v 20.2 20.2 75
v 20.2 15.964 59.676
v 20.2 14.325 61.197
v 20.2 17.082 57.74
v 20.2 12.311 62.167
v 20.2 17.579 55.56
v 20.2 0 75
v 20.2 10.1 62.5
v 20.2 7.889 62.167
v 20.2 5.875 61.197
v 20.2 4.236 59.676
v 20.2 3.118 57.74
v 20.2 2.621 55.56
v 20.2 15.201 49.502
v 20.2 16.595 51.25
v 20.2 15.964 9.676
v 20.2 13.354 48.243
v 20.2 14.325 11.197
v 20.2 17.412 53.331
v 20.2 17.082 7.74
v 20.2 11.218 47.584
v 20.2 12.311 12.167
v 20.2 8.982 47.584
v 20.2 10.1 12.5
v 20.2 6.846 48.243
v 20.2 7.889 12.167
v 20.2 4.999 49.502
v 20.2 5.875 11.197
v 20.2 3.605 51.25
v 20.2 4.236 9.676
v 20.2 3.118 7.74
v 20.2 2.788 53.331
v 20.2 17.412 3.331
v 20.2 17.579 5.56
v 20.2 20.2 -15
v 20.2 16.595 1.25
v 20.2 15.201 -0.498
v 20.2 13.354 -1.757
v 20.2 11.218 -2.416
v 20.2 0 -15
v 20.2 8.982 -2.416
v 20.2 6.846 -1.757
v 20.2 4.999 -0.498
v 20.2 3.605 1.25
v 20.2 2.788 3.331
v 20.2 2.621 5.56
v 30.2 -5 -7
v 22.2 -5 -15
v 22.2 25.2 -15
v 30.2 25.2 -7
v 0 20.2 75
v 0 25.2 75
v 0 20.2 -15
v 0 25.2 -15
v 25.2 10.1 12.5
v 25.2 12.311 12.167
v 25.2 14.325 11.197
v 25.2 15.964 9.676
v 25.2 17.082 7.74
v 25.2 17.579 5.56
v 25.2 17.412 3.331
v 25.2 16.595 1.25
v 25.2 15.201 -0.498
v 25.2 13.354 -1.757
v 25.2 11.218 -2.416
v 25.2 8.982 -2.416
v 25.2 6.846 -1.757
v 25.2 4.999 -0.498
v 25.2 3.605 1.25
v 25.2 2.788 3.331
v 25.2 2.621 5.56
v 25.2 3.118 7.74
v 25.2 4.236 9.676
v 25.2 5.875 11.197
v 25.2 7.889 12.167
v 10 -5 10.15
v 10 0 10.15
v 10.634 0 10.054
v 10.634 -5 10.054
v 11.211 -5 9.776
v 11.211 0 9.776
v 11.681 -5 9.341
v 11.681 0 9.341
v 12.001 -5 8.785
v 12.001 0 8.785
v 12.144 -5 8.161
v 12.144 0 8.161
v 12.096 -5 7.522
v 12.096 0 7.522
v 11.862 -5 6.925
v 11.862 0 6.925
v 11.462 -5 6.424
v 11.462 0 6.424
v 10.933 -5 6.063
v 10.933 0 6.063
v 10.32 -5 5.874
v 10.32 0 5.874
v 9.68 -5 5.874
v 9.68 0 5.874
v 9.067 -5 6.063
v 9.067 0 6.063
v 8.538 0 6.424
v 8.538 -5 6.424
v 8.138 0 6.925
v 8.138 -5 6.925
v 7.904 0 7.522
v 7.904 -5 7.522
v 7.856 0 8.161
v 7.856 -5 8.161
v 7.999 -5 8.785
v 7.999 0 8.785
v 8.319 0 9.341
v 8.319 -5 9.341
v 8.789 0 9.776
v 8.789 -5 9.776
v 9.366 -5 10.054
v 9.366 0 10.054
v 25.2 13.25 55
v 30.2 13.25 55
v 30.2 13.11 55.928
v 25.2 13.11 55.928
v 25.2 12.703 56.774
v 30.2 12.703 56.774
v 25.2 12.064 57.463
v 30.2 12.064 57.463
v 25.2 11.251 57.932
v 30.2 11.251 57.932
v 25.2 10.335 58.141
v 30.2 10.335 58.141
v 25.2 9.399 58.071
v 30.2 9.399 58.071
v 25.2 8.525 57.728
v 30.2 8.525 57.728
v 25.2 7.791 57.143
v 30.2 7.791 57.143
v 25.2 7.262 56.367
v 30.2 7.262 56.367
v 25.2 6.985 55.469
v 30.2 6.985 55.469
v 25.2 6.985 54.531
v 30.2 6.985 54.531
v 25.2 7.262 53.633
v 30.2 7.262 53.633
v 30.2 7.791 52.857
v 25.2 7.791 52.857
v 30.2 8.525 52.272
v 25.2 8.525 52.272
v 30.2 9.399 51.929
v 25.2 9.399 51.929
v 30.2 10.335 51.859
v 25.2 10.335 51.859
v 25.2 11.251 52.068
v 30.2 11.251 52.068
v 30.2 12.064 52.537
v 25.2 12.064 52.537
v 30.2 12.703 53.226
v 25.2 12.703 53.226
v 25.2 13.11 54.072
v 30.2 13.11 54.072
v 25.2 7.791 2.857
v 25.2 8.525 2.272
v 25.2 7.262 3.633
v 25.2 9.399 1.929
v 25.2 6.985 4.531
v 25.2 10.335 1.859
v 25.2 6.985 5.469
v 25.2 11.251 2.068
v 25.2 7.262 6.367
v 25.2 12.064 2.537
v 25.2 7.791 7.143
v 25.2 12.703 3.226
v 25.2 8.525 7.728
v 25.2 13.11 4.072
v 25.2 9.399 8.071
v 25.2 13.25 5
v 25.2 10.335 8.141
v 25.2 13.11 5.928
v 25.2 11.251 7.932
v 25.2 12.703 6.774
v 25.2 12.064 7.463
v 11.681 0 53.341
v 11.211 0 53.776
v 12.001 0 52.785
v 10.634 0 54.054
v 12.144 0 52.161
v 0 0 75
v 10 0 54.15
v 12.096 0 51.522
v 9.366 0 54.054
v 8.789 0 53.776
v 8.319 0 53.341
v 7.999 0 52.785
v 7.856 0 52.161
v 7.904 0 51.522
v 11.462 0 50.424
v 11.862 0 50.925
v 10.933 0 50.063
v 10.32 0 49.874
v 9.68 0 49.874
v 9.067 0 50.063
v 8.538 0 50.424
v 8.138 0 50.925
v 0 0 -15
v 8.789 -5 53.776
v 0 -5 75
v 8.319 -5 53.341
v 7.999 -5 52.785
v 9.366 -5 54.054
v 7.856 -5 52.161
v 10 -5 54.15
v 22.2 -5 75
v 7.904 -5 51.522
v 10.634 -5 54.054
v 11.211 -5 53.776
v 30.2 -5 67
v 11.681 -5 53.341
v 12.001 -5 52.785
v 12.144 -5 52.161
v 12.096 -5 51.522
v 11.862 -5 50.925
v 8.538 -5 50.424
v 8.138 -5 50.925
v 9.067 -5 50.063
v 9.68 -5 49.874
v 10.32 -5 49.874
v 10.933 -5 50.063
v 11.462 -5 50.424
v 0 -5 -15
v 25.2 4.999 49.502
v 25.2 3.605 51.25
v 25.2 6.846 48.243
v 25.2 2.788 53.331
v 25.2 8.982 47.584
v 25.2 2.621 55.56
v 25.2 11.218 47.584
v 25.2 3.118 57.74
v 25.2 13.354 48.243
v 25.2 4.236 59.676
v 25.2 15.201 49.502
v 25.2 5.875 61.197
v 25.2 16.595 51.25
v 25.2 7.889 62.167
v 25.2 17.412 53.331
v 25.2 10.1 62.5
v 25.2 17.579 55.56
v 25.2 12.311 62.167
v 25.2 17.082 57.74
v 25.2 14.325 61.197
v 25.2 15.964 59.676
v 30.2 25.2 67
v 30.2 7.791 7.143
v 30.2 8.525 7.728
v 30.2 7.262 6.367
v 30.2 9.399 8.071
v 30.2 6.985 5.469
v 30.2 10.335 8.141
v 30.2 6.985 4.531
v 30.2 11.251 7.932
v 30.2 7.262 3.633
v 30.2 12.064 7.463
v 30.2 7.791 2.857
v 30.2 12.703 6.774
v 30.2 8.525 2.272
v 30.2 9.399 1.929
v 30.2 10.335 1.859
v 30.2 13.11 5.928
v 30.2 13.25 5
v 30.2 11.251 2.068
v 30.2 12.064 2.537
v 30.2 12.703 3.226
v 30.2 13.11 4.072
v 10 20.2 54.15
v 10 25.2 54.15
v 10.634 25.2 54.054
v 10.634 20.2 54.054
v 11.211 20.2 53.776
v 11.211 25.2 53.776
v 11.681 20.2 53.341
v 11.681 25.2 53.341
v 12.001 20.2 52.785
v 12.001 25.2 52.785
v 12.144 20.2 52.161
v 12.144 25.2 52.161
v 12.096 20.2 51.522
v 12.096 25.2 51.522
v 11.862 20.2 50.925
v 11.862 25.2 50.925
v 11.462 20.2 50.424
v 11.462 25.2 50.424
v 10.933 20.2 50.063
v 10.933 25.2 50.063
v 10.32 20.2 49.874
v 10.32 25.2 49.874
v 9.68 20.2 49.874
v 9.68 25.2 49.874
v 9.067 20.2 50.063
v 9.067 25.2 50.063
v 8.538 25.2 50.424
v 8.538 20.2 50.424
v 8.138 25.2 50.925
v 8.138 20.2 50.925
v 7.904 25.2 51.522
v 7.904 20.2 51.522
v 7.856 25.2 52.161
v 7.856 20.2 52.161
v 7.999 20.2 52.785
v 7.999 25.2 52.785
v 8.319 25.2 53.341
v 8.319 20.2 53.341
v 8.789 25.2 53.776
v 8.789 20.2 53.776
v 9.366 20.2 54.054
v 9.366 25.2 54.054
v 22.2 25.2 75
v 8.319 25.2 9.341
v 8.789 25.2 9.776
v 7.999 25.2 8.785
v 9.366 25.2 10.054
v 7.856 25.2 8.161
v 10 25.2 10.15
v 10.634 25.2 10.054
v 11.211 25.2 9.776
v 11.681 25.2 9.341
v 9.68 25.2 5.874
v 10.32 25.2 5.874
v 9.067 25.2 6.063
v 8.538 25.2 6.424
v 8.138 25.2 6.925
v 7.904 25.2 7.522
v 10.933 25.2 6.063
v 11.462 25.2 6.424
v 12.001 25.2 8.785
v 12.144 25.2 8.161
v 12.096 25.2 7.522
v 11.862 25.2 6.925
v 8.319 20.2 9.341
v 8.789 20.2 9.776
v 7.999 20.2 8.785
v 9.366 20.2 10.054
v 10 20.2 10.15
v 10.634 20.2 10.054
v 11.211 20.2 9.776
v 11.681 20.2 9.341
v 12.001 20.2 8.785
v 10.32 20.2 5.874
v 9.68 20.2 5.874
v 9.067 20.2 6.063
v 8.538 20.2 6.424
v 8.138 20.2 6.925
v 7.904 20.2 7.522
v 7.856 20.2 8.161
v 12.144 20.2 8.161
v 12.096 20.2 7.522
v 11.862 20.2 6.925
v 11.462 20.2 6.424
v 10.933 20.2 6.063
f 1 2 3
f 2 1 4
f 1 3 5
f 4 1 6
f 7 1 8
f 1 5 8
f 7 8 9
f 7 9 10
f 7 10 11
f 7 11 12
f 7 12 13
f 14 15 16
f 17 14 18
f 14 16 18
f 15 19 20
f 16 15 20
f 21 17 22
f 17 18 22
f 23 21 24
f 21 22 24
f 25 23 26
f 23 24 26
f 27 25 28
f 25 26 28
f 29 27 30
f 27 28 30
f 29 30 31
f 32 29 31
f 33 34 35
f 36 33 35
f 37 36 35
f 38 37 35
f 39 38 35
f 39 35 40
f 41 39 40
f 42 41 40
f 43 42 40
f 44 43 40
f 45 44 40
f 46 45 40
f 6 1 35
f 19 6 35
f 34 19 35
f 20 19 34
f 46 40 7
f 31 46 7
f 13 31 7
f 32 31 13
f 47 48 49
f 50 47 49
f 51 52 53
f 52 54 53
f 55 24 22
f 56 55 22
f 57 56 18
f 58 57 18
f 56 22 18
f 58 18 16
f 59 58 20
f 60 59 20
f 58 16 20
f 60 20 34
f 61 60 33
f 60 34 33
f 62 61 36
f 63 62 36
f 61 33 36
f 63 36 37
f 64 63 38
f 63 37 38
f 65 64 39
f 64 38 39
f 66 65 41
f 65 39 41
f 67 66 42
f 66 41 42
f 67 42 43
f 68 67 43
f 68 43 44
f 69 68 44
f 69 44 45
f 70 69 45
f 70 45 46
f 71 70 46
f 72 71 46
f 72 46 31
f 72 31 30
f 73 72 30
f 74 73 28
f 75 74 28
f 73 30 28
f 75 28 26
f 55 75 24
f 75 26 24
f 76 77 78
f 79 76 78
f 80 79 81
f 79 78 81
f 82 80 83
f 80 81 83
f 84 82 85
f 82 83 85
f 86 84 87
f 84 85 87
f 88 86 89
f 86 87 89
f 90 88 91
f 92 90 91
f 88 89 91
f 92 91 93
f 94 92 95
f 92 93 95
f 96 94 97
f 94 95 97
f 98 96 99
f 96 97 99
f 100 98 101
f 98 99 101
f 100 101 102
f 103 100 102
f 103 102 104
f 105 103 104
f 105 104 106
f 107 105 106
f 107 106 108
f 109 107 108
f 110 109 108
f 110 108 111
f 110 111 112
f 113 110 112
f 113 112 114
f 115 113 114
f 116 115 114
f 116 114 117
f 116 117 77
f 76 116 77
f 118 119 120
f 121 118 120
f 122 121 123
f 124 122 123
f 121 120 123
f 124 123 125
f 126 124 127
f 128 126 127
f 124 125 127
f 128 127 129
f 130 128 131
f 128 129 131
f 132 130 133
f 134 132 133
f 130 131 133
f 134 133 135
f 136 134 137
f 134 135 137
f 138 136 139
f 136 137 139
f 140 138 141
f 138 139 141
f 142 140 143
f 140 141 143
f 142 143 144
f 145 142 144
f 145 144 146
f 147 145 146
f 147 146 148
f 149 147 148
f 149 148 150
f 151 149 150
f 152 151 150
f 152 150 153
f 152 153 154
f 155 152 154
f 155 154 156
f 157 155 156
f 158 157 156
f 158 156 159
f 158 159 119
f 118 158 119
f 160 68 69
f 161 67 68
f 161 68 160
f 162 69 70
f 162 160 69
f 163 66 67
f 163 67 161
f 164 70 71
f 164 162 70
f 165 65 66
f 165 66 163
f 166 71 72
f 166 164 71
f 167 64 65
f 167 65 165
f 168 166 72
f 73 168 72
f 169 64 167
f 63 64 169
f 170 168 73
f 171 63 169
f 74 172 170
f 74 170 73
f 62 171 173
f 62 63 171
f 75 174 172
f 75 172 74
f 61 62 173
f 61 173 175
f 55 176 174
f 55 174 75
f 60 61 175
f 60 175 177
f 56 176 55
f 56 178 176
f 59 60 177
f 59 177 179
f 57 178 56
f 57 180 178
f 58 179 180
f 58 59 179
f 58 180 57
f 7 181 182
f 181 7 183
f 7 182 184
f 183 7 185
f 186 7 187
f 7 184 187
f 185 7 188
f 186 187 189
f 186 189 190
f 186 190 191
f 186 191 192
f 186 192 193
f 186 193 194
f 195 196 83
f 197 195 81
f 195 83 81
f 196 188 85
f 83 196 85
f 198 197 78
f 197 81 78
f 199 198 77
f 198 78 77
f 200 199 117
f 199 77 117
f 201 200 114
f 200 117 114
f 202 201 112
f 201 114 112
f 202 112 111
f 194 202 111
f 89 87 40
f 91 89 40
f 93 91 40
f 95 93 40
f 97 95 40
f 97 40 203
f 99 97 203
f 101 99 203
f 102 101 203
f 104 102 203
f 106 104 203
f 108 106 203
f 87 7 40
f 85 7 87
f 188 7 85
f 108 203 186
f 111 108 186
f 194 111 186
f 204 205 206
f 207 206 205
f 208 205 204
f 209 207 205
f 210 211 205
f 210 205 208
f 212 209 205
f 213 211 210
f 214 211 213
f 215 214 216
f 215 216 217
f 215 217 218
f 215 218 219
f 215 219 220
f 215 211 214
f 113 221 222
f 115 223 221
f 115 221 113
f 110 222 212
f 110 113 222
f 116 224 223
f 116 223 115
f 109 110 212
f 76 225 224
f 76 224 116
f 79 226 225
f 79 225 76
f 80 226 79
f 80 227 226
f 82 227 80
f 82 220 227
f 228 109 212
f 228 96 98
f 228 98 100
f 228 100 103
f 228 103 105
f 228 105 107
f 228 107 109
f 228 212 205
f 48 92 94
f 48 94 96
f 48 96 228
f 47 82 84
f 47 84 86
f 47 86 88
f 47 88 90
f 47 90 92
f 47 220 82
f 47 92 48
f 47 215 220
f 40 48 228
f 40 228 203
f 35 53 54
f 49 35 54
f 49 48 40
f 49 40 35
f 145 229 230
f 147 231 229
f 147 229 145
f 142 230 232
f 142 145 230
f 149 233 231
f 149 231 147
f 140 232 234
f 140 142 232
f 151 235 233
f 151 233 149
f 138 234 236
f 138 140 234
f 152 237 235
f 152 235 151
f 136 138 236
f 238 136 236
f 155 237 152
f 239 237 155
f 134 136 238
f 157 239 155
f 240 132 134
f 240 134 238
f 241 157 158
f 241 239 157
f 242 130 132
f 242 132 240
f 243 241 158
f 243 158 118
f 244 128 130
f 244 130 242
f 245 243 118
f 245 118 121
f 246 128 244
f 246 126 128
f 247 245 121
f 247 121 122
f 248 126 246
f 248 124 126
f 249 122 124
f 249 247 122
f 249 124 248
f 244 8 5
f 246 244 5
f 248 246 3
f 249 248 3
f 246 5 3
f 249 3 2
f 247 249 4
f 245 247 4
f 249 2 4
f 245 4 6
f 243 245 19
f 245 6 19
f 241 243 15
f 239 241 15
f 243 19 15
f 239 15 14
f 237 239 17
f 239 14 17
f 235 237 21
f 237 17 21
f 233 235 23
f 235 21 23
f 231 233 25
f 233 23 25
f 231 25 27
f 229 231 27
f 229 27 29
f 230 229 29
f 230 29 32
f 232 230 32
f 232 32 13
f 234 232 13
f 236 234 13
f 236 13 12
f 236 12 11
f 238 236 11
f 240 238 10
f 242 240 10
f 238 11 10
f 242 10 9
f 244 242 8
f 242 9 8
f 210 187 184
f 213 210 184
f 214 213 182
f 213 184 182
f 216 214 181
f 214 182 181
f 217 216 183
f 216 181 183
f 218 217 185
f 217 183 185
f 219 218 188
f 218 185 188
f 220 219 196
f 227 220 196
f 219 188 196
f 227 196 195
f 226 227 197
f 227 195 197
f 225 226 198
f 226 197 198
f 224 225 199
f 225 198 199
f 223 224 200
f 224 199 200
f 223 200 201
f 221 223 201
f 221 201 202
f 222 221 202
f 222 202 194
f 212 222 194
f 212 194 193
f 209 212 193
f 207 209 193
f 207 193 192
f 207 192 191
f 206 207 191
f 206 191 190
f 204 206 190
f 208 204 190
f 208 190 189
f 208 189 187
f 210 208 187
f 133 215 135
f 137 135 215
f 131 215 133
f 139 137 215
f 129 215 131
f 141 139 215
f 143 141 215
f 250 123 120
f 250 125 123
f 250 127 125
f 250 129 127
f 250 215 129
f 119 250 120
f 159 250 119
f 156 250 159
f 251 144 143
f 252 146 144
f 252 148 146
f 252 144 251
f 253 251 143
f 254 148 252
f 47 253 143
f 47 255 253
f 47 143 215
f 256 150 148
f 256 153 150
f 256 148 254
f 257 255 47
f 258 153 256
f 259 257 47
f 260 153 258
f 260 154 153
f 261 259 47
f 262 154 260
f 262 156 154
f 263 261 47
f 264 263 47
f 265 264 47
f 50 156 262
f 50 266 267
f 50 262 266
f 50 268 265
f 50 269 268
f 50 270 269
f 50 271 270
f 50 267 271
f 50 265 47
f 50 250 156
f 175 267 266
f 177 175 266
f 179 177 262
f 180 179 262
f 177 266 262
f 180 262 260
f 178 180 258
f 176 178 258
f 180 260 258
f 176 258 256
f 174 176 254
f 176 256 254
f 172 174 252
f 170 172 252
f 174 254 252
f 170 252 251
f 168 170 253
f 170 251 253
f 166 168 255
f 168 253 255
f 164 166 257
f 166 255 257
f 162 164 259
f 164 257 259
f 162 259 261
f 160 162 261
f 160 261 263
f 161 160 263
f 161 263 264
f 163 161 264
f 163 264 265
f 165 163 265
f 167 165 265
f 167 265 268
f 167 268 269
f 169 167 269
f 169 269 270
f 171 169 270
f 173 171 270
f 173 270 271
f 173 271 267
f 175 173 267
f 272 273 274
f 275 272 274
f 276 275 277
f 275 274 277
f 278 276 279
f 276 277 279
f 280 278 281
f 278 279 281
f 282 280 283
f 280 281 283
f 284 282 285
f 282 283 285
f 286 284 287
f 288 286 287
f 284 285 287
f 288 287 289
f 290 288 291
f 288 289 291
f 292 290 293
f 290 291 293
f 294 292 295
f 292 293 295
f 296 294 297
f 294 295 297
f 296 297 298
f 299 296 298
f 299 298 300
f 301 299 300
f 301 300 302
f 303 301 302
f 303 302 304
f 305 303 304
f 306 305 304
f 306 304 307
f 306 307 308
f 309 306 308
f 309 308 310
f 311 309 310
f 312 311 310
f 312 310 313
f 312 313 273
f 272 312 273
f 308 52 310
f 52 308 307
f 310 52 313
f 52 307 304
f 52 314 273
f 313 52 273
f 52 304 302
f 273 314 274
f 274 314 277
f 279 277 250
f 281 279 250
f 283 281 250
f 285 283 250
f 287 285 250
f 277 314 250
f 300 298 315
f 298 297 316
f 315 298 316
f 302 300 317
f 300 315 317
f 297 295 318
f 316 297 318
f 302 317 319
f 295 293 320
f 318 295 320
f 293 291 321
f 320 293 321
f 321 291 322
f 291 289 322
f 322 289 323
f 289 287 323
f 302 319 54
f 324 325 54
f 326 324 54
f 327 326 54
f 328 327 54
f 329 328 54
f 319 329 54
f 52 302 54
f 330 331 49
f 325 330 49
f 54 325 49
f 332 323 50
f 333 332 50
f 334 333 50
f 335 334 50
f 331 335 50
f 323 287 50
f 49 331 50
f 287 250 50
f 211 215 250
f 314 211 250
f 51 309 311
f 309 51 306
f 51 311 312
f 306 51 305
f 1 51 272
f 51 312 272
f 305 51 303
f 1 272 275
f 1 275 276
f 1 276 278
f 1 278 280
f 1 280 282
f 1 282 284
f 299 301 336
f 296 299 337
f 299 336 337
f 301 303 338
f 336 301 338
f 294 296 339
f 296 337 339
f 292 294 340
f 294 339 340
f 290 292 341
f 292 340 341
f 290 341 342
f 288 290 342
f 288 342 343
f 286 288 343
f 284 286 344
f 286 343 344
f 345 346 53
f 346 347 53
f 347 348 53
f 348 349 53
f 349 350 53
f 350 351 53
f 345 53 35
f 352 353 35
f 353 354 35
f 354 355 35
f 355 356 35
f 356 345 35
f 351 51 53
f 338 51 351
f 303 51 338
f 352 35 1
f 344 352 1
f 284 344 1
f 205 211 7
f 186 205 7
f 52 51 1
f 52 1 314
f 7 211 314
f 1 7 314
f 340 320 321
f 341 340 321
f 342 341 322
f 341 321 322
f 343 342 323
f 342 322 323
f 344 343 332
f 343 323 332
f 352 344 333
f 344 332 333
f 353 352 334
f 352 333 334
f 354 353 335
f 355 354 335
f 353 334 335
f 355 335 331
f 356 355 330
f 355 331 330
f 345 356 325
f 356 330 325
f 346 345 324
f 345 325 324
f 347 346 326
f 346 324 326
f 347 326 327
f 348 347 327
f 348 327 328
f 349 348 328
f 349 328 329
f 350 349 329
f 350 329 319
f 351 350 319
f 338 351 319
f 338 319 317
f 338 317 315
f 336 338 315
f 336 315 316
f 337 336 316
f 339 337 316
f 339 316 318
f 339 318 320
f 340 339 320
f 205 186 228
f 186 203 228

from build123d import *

# Parameters (mm, degrees)
EXTRUDE_1_DEPTH     = 60
SKETCH_4_R          = 2.15
CUT_EXTRUDE_1_DEPTH = 40
SKETCH_5_R          = 3.15
CUT_EXTRUDE_2_DEPTH = 40
EXTRUDE_6_DEPTH     = 15
EXTRUDE_7_DEPTH     = 15
EXTRUDE_START       = 5
SKETCH_12_W         = 90
SKETCH_12_H         = 30.2
SKETCH_12_R         = 3.15
EXTRUDE_8_DEPTH     = 5
CHAMFER_6_SIZE      = 8
SKETCH_13_R         = 7.5
CUT_EXTRUDE_5_DEPTH = 5


with BuildPart() as part:
    # 草图1 → 凸台-拉伸1 (new body)
    with BuildSketch(Plane.XY):
        Polygon((0, 0), (0, -5), (25.2, -5), (25.2, 25.2), (0, 25.2), (0, 20.2), (20.2, 20.2), (20.2, 0), align=None)
    extrude(amount=EXTRUDE_1_DEPTH)

    # 草图4 → 切除-拉伸1 (cut)
    with BuildSketch(Plane(origin=(0, 25.2, 0), x_dir=(1, 0, 0), z_dir=(0, 1, 0))):
        with Locations(Location((10, -8, 0), (0, 0, 270))):
            Circle(SKETCH_4_R)
        with Locations(Location((10, -52, 0), (0, 0, 270))):
            Circle(SKETCH_4_R)
    extrude(amount=-CUT_EXTRUDE_1_DEPTH, mode=Mode.SUBTRACT)

    # 草图5 → 切除-拉伸2 (cut)
    with BuildSketch(Plane(origin=(25.2, 0, 0), x_dir=(0, 0, -1), z_dir=(1, 0, 0))):
        with Locations(Location((-55, 10.1, 0), (0, 0, 90))):
            Circle(SKETCH_5_R)
        with Locations(Location((-5, 10.1, 0), (0, 0, 90))):
            Circle(SKETCH_5_R)
    extrude(amount=-CUT_EXTRUDE_2_DEPTH, mode=Mode.SUBTRACT)

    # 草图10 → 凸台-拉伸6 (add)
    with BuildSketch(Plane(origin=(0, 0, 0), x_dir=(-1, 0, 0), z_dir=(0, 0, -1))):
        Polygon((-20.2, 20.2), (0, 20.2), (0, 25.2), (-25.2, 25.2), (-25.2, -5), (0, -5), (0, 0), (-20.2, 0), align=None)
    extrude(amount=EXTRUDE_6_DEPTH)

    # 草图11 → 凸台-拉伸7 (add)
    with BuildSketch(Plane.XY.offset(60)):
        Polygon((20.2, 0), (0, 0), (0, -5), (25.2, -5), (25.2, 25.2), (0, 25.2), (0, 20.2), (20.2, 20.2), align=None)
    extrude(amount=EXTRUDE_7_DEPTH)

    # 草图12 → 凸台-拉伸8 (add)
    with BuildSketch(Plane(origin=(25.2, 0, 0), x_dir=(0, 0, -1), z_dir=(1, 0, 0)).offset(EXTRUDE_START)):
        with Locations((-30, 10.1)):
            Rectangle(SKETCH_12_W, SKETCH_12_H)
        with Locations(Location((-55, 10.1, 0), (0, 0, 90))):
            Circle(SKETCH_12_R, mode=Mode.SUBTRACT)
        with Locations(Location((-5, 10.1, 0), (0, 0, 90))):
            Circle(SKETCH_12_R, mode=Mode.SUBTRACT)
    extrude(amount=-EXTRUDE_8_DEPTH)

    # 倒角6
    chamfer_6_edges = [part.edges().sort_by_distance(p)[0] for p in [
        (30.2, 10.1, -15),
        (30.2, 10.1, 75),
    ]]
    chamfer(chamfer_6_edges, length=CHAMFER_6_SIZE)

    # 草图13 → 切除-拉伸5 (cut)
    with BuildSketch(Plane.ZY.offset(-20.2)):
        with Locations((5, 10.1)):
            Circle(SKETCH_13_R)
        with Locations((55, 10.1)):
            Circle(SKETCH_13_R)
    extrude(amount=-CUT_EXTRUDE_5_DEPTH, mode=Mode.SUBTRACT)


solid = part.part
